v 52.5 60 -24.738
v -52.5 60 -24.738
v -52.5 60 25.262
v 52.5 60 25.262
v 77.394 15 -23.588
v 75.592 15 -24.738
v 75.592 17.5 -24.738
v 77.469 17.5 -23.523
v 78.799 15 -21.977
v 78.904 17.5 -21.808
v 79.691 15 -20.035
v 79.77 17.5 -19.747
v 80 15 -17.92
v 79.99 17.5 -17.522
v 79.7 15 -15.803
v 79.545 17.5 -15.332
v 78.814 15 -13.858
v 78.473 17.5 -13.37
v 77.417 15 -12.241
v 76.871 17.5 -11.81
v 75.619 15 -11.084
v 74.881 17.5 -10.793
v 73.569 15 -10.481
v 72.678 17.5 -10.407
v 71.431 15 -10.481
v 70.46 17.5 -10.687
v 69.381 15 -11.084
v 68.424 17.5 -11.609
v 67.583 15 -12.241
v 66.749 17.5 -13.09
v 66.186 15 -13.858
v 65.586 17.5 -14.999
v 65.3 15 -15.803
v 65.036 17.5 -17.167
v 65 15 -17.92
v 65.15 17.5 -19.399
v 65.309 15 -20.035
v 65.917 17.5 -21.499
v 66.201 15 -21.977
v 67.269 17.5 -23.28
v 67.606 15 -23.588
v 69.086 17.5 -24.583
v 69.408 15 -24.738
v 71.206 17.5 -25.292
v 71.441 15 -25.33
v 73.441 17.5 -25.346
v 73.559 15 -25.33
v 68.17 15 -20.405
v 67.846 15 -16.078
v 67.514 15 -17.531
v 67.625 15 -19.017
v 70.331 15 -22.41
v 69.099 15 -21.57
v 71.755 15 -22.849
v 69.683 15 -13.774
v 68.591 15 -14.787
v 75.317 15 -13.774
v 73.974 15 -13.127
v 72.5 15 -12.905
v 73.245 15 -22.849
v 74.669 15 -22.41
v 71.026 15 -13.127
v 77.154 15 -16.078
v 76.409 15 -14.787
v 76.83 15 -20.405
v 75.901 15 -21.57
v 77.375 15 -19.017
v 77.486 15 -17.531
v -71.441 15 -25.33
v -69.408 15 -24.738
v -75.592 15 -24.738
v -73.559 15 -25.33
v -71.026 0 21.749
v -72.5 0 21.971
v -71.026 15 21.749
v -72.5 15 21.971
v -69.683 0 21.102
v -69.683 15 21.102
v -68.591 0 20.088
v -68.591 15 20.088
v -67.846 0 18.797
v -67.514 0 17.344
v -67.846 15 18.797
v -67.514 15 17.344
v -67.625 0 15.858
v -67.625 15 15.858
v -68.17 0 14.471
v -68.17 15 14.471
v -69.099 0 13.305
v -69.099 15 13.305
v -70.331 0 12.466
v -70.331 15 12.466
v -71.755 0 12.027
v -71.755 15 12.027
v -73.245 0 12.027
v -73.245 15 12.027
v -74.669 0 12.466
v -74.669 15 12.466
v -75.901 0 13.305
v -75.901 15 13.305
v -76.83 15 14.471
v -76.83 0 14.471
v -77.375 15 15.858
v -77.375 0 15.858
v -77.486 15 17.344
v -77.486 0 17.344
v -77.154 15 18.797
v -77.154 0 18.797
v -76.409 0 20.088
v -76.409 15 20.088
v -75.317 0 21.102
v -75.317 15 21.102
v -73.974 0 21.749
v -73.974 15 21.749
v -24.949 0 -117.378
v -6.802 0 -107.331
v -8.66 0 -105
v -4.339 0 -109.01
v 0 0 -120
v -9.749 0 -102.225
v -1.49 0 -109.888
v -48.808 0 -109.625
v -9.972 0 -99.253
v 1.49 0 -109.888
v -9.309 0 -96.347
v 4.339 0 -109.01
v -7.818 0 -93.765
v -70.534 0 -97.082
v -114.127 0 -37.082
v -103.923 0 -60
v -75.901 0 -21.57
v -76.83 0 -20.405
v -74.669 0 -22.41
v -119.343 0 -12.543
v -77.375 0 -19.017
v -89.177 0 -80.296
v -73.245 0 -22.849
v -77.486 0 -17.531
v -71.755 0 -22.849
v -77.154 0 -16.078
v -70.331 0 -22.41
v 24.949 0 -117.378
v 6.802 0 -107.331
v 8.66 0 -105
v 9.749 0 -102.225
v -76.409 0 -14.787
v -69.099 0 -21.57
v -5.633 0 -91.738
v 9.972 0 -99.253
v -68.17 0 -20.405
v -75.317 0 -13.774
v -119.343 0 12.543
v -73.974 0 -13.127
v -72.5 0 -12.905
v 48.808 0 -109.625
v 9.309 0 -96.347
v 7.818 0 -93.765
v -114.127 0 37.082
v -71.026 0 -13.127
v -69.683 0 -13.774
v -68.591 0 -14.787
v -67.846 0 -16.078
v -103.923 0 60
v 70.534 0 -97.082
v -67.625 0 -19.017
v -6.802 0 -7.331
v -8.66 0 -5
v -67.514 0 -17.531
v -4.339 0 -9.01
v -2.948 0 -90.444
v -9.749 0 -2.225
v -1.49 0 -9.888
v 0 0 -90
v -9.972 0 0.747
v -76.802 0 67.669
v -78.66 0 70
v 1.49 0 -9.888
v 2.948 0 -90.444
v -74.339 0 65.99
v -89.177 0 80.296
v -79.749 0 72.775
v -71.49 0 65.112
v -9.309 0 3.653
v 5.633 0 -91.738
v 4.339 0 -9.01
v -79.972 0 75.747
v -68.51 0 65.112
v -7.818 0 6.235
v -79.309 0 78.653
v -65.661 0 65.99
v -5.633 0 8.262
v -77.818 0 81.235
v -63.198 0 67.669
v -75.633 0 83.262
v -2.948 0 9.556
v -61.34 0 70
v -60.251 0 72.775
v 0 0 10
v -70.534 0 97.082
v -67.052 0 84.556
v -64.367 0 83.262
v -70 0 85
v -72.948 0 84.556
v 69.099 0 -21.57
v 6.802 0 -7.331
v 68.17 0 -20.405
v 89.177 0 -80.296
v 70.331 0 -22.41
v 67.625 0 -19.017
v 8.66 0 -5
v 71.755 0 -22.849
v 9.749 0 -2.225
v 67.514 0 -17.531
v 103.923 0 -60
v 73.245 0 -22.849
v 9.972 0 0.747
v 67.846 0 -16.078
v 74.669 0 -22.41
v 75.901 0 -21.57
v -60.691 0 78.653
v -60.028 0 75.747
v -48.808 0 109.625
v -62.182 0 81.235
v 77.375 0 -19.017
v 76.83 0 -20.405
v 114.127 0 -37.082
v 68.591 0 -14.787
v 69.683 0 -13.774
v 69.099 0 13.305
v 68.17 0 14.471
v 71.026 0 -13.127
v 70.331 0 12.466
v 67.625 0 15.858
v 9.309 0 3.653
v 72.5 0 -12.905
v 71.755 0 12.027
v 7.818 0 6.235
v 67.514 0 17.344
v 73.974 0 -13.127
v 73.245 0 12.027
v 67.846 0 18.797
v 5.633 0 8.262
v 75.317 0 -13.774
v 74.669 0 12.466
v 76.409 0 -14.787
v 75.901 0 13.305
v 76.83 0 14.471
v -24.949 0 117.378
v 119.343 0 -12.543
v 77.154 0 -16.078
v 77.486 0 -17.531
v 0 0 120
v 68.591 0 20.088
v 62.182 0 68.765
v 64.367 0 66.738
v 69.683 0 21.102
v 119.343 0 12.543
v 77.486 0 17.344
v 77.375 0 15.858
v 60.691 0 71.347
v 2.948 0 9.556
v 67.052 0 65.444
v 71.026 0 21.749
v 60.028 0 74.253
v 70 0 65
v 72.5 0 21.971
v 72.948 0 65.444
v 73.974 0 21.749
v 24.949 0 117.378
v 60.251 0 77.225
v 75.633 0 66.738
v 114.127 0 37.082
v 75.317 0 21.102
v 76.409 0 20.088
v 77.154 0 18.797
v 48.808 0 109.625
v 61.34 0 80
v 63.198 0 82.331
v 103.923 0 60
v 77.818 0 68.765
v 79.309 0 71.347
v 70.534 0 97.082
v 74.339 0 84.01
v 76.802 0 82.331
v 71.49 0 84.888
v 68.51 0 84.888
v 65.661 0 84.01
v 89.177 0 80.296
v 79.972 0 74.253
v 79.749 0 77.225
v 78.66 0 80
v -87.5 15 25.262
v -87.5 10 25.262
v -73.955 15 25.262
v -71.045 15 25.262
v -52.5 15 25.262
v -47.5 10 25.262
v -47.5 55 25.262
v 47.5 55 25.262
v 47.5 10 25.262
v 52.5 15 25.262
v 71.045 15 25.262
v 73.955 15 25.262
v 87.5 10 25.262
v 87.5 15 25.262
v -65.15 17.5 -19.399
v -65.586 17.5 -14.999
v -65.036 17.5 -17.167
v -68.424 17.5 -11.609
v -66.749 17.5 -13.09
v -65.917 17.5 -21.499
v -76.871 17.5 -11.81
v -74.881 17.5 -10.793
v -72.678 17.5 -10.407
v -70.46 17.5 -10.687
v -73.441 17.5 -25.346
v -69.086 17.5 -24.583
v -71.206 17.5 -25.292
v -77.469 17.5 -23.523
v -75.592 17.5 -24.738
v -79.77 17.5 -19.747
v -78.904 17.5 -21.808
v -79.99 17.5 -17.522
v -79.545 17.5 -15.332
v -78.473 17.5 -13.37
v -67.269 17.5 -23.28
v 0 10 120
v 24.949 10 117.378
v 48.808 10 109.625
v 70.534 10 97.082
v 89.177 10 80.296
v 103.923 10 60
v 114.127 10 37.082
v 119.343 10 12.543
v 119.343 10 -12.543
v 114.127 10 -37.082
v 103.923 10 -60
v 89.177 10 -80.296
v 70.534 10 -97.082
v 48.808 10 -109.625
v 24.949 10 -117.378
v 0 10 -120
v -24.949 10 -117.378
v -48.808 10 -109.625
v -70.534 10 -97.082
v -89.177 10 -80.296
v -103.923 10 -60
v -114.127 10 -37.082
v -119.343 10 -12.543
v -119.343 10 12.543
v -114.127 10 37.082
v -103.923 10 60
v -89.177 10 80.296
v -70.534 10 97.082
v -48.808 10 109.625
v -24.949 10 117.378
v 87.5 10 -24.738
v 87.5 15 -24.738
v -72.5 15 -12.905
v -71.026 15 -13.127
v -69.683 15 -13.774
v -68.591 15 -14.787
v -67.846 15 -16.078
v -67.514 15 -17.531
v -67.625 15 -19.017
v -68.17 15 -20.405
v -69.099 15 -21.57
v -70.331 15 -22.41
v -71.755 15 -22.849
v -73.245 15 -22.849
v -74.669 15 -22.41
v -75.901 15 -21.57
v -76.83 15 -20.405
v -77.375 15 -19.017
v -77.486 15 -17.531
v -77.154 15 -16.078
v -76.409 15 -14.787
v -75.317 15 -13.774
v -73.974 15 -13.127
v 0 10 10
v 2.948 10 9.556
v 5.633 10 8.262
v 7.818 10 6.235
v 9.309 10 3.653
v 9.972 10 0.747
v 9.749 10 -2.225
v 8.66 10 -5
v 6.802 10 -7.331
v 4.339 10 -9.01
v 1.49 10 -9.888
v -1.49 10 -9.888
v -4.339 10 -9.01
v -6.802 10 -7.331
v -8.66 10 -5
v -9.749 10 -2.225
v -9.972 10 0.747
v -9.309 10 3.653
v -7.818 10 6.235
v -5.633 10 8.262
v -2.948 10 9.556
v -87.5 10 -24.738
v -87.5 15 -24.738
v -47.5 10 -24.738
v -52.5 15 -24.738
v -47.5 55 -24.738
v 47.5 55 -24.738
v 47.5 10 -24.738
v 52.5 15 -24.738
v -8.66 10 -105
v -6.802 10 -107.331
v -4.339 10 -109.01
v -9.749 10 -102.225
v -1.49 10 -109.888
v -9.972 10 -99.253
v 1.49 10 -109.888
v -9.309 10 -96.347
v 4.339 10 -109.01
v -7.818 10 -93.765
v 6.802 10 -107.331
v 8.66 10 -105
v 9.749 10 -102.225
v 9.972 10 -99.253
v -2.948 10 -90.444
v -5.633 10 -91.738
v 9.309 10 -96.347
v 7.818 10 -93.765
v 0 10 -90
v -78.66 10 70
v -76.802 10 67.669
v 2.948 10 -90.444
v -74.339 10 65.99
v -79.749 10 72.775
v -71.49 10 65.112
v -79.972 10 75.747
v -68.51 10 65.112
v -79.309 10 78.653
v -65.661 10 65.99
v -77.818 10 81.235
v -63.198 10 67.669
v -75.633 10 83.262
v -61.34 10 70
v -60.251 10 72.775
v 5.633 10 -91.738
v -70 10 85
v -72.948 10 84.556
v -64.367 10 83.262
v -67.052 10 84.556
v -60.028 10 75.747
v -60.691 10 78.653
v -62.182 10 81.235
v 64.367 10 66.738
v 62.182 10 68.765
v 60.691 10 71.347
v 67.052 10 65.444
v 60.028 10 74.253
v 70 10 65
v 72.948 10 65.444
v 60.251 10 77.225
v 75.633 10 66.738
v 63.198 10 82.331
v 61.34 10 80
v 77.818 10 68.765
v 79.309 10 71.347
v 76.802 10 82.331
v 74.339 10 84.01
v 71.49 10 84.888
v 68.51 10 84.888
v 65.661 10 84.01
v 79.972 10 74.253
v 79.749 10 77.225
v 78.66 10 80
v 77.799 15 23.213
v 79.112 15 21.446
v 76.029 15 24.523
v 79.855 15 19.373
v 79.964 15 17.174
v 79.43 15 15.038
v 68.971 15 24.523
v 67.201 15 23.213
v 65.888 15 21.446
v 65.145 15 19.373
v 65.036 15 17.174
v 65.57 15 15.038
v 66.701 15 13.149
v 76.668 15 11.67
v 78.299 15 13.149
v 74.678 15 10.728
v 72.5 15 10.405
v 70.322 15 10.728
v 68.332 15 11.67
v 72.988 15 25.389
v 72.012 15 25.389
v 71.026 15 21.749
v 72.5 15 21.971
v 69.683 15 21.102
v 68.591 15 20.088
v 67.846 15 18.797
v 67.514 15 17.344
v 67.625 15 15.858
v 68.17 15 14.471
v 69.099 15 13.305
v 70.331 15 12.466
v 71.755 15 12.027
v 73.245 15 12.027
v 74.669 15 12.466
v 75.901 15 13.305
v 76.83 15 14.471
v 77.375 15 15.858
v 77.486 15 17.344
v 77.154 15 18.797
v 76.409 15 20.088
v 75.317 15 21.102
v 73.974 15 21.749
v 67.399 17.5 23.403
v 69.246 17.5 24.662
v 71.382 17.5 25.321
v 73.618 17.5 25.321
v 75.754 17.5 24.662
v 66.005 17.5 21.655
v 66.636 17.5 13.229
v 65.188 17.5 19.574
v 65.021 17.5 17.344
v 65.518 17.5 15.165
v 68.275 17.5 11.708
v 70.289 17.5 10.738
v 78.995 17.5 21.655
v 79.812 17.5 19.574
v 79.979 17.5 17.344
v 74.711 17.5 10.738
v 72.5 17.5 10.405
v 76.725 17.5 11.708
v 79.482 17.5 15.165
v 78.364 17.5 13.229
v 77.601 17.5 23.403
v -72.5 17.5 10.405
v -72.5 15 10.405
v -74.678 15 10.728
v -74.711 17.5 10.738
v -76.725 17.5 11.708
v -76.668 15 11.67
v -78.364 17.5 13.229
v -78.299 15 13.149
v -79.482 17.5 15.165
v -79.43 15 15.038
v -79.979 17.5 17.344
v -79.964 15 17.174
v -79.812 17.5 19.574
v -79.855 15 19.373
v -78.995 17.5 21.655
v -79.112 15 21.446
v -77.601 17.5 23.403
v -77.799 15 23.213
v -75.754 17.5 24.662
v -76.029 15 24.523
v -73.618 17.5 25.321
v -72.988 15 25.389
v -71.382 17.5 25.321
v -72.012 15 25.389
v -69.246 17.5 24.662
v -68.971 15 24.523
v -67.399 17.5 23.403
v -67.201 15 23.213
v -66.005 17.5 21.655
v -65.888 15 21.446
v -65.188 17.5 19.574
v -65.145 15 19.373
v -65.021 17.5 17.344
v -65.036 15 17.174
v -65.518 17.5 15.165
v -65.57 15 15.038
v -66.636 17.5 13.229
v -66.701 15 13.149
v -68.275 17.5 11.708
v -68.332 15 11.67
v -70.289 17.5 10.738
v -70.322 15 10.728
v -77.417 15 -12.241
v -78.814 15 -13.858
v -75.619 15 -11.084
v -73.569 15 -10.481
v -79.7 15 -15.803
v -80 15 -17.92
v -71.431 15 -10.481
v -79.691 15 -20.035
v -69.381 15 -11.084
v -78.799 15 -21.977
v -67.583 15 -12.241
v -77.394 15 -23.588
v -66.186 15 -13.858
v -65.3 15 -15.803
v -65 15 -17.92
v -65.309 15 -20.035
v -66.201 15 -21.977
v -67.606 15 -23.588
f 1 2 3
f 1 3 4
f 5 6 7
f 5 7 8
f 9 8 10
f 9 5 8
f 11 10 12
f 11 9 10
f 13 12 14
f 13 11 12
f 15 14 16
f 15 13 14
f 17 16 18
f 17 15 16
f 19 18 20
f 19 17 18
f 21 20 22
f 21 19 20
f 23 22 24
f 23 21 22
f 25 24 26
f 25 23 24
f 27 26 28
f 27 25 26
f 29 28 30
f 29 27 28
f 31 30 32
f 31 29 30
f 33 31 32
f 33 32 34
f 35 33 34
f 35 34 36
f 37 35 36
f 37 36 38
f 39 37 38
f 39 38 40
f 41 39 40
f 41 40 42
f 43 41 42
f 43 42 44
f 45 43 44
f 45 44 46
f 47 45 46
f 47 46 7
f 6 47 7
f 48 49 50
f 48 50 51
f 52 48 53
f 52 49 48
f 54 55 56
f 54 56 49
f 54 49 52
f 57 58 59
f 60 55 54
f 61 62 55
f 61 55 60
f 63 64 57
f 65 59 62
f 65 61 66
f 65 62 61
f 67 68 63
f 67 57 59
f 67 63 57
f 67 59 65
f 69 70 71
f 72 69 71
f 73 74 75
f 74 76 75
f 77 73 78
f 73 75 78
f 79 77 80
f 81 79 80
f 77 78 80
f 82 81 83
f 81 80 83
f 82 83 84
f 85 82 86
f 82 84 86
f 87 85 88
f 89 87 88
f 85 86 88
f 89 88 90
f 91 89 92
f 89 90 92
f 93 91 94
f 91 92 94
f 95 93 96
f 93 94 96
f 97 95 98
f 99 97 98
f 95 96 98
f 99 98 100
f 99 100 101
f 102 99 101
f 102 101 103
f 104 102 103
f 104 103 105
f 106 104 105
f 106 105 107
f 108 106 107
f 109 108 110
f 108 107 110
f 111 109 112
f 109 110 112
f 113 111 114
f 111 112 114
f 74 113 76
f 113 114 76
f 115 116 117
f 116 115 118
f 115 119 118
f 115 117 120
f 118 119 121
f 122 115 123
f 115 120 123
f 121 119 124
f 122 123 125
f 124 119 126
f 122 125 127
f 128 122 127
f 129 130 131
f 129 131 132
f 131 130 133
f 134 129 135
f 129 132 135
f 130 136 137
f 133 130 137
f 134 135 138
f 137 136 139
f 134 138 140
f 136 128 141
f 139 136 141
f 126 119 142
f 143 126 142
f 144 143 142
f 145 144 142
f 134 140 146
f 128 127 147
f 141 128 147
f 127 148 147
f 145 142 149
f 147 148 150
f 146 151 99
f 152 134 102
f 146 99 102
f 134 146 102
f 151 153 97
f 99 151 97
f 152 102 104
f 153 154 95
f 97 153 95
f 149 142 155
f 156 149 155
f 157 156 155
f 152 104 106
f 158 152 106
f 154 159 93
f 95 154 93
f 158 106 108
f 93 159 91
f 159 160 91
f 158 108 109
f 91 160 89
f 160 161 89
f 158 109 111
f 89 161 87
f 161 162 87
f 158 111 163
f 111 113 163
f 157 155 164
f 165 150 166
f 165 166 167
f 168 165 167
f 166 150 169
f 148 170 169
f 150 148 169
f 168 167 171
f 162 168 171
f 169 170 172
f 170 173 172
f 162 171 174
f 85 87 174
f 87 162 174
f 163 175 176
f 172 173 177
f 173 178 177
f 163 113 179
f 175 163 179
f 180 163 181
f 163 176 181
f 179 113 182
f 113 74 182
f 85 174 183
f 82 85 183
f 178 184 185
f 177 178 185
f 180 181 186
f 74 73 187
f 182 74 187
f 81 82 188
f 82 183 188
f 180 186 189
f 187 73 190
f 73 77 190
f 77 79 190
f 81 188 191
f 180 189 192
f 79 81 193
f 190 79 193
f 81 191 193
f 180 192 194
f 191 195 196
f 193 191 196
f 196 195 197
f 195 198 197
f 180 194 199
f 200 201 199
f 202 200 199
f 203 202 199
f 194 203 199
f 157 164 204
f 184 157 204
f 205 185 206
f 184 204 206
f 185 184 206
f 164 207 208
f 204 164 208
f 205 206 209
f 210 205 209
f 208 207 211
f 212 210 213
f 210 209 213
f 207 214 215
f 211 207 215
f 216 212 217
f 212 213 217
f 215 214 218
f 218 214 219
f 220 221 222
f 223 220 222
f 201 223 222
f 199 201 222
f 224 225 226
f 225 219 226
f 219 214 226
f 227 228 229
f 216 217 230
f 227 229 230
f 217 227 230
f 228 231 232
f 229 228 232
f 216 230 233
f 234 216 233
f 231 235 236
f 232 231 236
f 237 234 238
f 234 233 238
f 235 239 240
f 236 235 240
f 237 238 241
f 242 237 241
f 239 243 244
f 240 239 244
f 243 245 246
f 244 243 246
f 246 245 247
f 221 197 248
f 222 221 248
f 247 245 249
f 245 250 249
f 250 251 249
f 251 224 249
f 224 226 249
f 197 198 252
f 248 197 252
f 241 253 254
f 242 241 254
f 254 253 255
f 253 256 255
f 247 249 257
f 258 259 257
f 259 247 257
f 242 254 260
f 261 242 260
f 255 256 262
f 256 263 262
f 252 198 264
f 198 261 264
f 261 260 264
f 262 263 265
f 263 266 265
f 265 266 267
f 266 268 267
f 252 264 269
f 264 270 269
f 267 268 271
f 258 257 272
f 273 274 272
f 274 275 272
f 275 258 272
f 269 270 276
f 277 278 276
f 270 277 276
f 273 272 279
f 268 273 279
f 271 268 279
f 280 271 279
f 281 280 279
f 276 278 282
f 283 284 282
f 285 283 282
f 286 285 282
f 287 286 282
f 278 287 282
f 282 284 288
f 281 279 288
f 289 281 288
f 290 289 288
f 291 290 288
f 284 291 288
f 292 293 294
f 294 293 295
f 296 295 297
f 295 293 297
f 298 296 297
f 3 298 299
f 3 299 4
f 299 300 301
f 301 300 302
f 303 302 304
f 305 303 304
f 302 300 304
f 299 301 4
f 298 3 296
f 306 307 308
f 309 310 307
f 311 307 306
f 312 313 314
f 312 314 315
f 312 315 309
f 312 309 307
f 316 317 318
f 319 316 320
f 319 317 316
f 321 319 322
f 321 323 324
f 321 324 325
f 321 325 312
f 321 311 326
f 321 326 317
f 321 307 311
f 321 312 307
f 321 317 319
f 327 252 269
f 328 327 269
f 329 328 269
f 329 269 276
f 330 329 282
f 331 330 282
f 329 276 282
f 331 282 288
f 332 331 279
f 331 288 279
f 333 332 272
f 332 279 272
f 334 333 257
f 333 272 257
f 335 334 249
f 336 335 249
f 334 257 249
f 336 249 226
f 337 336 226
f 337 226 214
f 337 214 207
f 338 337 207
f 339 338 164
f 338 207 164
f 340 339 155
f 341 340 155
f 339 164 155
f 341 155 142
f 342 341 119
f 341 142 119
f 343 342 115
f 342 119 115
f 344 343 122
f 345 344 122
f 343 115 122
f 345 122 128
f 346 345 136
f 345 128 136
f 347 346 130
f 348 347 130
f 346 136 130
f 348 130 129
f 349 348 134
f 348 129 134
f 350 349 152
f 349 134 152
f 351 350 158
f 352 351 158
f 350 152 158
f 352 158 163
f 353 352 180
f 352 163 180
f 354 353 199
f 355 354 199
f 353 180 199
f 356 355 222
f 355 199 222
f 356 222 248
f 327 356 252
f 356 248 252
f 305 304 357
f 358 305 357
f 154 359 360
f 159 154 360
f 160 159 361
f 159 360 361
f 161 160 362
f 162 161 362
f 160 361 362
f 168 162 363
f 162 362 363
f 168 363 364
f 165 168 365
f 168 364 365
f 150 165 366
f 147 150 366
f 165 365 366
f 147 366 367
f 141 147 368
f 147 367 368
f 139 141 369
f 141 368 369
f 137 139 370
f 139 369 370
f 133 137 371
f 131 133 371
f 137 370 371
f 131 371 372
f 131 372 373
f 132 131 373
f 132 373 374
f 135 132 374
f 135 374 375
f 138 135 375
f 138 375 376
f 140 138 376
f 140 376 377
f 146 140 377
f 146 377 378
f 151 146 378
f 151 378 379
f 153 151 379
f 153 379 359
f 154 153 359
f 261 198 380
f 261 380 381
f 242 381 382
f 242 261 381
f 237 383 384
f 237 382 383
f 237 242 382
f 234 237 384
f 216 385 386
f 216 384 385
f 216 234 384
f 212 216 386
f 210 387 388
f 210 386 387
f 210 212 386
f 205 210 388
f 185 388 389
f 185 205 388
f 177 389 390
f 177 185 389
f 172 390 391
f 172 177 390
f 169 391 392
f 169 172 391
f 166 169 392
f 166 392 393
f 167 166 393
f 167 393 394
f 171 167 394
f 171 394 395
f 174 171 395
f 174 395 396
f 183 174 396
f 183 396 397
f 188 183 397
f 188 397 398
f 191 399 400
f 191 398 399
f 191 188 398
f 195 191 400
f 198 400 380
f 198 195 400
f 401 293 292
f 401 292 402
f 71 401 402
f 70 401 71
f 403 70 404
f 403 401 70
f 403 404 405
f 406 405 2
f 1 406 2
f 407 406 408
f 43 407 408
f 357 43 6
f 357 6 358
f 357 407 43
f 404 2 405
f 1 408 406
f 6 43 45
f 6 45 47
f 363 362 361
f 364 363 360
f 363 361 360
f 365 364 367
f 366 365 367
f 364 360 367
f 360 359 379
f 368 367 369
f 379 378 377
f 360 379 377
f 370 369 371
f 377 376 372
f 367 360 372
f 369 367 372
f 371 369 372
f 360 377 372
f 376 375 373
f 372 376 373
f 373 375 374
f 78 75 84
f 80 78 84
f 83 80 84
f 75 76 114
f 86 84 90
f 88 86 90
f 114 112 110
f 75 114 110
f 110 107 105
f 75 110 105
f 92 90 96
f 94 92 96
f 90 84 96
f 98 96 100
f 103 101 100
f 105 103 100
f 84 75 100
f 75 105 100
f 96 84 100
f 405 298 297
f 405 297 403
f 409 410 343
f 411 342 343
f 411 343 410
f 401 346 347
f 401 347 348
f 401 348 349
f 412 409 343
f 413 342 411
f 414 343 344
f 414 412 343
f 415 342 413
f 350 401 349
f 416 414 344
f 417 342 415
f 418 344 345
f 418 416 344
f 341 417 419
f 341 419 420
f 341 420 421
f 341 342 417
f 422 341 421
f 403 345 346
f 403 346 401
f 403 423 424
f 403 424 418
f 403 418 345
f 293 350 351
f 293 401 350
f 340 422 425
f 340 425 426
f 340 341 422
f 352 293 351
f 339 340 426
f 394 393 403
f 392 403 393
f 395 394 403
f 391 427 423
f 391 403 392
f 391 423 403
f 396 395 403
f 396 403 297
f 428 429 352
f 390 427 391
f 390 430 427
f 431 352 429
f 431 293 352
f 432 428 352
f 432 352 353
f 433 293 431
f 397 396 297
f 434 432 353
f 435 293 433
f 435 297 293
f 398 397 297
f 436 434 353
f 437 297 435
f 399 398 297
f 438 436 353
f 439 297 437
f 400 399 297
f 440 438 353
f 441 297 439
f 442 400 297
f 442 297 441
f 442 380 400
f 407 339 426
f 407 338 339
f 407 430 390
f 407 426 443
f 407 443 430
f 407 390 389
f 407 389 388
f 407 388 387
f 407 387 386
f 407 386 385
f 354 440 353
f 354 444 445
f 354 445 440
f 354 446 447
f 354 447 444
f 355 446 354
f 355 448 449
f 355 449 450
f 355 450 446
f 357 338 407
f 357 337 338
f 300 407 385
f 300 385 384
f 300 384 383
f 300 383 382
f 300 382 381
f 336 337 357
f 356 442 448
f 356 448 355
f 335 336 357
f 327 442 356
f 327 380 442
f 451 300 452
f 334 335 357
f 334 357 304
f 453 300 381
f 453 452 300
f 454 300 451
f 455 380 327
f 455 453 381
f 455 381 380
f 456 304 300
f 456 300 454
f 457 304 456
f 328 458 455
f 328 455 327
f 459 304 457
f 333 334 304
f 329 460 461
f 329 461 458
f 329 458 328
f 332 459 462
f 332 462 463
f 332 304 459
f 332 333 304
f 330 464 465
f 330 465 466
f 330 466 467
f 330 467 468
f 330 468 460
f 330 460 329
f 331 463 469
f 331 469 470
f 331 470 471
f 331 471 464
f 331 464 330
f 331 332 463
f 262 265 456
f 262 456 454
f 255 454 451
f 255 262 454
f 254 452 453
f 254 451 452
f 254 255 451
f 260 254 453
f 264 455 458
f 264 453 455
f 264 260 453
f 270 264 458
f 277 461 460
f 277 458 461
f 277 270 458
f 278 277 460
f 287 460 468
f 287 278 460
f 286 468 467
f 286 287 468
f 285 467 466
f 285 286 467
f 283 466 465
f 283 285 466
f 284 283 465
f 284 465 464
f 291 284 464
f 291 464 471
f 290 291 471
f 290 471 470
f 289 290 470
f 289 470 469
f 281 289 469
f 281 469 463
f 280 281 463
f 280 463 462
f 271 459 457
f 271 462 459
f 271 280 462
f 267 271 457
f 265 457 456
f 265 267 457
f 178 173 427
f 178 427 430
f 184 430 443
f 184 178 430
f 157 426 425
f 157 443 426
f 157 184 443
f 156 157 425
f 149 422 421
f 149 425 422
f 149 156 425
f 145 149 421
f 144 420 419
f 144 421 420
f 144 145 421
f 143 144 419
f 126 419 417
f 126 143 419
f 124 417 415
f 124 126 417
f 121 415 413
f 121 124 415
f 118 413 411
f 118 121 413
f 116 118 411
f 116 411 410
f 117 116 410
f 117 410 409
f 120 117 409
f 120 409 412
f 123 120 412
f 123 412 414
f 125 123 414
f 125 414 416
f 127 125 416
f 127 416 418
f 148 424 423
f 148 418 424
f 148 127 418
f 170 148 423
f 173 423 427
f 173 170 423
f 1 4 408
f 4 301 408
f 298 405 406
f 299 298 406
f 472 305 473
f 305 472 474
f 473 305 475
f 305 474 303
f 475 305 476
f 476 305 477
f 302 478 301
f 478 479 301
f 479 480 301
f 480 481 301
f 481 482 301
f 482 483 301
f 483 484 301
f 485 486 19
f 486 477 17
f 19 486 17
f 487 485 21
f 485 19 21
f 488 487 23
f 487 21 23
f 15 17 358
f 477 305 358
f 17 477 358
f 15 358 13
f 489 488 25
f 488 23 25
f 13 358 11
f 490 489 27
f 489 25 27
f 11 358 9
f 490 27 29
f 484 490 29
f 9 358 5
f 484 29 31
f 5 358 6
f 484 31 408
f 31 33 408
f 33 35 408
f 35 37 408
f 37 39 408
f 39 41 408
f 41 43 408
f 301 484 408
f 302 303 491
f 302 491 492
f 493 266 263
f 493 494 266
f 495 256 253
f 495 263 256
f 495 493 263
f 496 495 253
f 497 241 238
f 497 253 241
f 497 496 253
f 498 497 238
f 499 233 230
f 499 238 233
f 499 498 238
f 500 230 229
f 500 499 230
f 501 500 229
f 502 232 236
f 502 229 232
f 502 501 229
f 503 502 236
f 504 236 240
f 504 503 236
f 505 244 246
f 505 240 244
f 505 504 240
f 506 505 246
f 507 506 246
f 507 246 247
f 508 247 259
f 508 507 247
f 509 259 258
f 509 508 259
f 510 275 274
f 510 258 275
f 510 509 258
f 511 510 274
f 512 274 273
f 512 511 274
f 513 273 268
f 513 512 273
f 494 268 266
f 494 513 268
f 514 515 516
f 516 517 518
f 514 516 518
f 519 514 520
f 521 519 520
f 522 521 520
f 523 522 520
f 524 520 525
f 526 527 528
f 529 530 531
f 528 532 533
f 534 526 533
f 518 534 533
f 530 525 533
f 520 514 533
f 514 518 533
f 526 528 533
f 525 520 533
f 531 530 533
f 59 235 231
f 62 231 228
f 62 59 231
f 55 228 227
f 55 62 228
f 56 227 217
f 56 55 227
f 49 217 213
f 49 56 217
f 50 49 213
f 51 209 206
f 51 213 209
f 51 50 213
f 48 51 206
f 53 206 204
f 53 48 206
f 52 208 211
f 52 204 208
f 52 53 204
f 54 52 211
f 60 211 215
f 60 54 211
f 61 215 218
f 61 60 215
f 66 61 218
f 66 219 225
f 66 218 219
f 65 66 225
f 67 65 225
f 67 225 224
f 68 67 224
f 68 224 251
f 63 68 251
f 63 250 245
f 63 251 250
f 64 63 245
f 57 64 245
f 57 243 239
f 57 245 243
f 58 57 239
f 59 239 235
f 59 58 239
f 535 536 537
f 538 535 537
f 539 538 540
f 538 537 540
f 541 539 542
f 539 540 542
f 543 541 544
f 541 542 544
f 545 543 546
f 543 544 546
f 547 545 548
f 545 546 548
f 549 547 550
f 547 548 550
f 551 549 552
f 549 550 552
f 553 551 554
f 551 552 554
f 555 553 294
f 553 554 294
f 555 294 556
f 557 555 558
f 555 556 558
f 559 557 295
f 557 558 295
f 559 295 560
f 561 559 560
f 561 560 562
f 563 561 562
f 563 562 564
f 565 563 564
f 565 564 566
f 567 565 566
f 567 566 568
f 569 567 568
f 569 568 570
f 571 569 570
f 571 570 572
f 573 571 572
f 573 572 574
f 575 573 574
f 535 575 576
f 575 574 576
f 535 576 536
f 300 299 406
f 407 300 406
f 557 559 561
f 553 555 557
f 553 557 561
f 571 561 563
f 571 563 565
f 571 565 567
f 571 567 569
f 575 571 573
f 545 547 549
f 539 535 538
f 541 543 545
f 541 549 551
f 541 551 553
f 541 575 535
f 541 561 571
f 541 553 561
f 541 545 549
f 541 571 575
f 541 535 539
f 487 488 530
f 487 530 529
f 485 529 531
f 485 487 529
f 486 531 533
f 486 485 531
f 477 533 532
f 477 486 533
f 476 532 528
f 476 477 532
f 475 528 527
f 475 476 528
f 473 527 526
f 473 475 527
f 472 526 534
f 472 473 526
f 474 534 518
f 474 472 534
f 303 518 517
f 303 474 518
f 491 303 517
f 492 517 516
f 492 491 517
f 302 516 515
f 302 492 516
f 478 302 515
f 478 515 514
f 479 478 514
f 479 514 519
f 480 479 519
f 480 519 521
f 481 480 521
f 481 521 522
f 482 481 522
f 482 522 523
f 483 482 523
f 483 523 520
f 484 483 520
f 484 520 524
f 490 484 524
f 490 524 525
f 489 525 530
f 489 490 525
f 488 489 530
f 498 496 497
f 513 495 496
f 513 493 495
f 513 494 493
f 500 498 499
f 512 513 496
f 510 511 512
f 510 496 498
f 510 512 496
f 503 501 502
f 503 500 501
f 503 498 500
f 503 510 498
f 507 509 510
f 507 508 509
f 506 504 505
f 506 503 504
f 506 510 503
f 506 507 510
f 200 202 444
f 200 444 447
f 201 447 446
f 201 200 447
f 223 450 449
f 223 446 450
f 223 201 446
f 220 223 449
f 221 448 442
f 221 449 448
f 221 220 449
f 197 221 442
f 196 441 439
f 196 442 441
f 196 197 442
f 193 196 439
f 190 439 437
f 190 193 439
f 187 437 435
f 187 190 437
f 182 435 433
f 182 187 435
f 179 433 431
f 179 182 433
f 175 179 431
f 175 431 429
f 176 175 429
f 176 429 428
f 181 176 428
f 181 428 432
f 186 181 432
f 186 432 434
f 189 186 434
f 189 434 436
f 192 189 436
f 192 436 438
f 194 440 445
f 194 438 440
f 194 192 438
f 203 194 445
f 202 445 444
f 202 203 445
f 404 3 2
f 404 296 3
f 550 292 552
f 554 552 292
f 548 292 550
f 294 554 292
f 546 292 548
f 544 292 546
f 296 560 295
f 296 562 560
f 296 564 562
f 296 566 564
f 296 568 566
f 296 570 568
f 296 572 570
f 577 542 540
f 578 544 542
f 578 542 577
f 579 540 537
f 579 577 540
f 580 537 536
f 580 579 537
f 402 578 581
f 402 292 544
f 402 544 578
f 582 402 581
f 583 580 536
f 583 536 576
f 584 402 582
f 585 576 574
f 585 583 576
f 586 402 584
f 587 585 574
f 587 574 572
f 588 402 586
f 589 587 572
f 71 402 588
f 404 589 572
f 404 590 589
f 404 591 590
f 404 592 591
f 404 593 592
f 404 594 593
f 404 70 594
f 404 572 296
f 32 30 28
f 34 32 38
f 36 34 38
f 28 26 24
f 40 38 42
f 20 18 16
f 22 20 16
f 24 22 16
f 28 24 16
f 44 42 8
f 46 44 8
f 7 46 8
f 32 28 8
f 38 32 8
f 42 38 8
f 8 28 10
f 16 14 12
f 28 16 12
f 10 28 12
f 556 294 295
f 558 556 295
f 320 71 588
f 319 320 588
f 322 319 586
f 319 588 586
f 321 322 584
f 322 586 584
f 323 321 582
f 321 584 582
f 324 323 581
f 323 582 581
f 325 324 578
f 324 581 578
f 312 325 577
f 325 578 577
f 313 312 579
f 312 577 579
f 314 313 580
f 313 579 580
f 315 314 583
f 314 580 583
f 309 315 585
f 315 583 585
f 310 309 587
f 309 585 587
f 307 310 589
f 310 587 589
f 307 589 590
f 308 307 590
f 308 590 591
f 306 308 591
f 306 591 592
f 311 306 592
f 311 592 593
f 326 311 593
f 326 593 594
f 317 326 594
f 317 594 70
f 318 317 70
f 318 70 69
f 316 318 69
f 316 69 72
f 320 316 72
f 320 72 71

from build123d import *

# Parameters (mm, degrees)
SKETCH1_R               = 120
BOSS_EXTRUDE1_DEPTH     = 10
CUT_EXTRUDE1_DEPTH      = 171
CUT_EXTRUDE1_DEPTH_BACK = 171
SKETCH2_R               = 10
CUT_EXTRUDE2_DEPTH      = 171
CUT_EXTRUDE2_DEPTH_BACK = 171
SKETCH3_R               = 10
SKETCH8_W               = 35
SKETCH8_H               = 50
BOSS_EXTRUDE3_DEPTH     = 5
SKETCH9_W               = 50
SKETCH9_H               = 45
BOSS_EXTRUDE4_DEPTH     = 5
SKETCH10_W              = 105
SKETCH10_H              = 50
BOSS_EXTRUDE5_DEPTH     = 5
SKETCH11_R              = 5
CUT_EXTRUDE3_DEPTH      = 176.570498661
SKETCH12_R              = 7.5
BOSS_EXTRUDE6_DEPTH     = 2.5


with BuildPart() as part:
    # Sketch1 → Boss-Extrude1 (new body)
    with BuildSketch(Plane(origin=(0, 0, 0), x_dir=(1, 0, 0), z_dir=(0, 1, 0))):
        with Locations(Location((0, 0, 0), (0, 0, 270))):
            Circle(SKETCH1_R)
    extrude(amount=BOSS_EXTRUDE1_DEPTH)

    # Sketch2 → Cut-Extrude1 (cut, two sides: drawn at the far end of the back side and taken through both)
    with BuildSketch(Plane(origin=(0, 10, 0), x_dir=(1, 0, 0), z_dir=(0, 1, 0)).offset(-CUT_EXTRUDE1_DEPTH_BACK)):
        with Locations(Location((0, 0, 0), (0, 0, 270))):
            Circle(SKETCH2_R)
    extrude(amount=CUT_EXTRUDE1_DEPTH + CUT_EXTRUDE1_DEPTH_BACK, mode=Mode.SUBTRACT)

    # Sketch3 → Cut-Extrude2 (cut, two sides: drawn at the far end of the back side and taken through both)
    with BuildSketch(Plane(origin=(0, 10, 0), x_dir=(1, 0, 0), z_dir=(0, 1, 0)).offset(-CUT_EXTRUDE2_DEPTH_BACK)):
        with Locations(Location((0, 100, 0), (0, 0, 270))):
            Circle(SKETCH3_R)
        with Locations(Location((-70, -75, 0), (0, 0, 270))):
            Circle(SKETCH3_R)
        with Locations(Location((70, -75, 0), (0, 0, 90))):
            Circle(SKETCH3_R)
    extrude(amount=CUT_EXTRUDE2_DEPTH + CUT_EXTRUDE2_DEPTH_BACK, mode=Mode.SUBTRACT)

    # Sketch8 → Boss-Extrude3 (add)
    with BuildSketch(Plane(origin=(0, 10, 0), x_dir=(1, 0, 0), z_dir=(0, 1, 0))):
        with Locations((-70, -0.262373312)):
            Rectangle(SKETCH8_W, SKETCH8_H)
    boss_extrude3 = extrude(amount=BOSS_EXTRUDE3_DEPTH)

    # Mirror2: Boss-Extrude3 across plane
    add(boss_extrude3.mirror(Plane(origin=(0, 0, 0), x_dir=(0, 0, 1), z_dir=(1, 0, 0))))

    # Sketch9 → Boss-Extrude4 (add)
    with BuildSketch(Plane(origin=(-52.5, 0, 0), x_dir=(0, 0, -1), z_dir=(1, 0, 0))):
        with Locations((-0.262373312, 32.5)):
            Rectangle(SKETCH9_W, SKETCH9_H)
    boss_extrude4 = extrude(amount=BOSS_EXTRUDE4_DEPTH)

    # Mirror3: Boss-Extrude4 across plane
    add(boss_extrude4.mirror(Plane(origin=(0, 0, 0), x_dir=(0, 0, 1), z_dir=(1, 0, 0))))

    # Sketch10 → Boss-Extrude5 (add)
    with BuildSketch(Plane(origin=(0, 55, 0), x_dir=(1, 0, 0), z_dir=(0, 1, 0))):
        with Locations((0, -0.262373312)):
            Rectangle(SKETCH10_W, SKETCH10_H)
    extrude(amount=BOSS_EXTRUDE5_DEPTH)

    # Sketch11 → Cut-Extrude3 (cut, symmetric)
    with BuildSketch(Plane(origin=(0, 15, 0), x_dir=(1, 0, 0), z_dir=(0, 1, 0))):
        with Locations(Location((-72.5, 17.904853765, 0), (0, 0, 270))):
            Circle(SKETCH11_R)
        with Locations(Location((-72.5, -16.970687481, 0), (0, 0, 270))):
            Circle(SKETCH11_R)
    cut_extrude3 = extrude(amount=CUT_EXTRUDE3_DEPTH, both=True, mode=Mode.SUBTRACT)

    # Mirror4: Cut-Extrude3 across plane
    add(cut_extrude3.mirror(Plane(origin=(0, 0, 0), x_dir=(0, 0, 1), z_dir=(1, 0, 0))), mode=Mode.SUBTRACT)

    # Sketch12 → Boss-Extrude6 (add)
    with BuildSketch(Plane(origin=(0, 15, 0), x_dir=(1, 0, 0), z_dir=(0, 1, 0))):
        with Locations(Location((-72.5, 17.904853765, 0), (0, 0, 114.351031906))):
            Circle(SKETCH12_R)
        with Locations(Location((-72.5, -17.904853765, 0), (0, 0, 90))):
            Circle(SKETCH12_R)
    boss_extrude6 = extrude(amount=BOSS_EXTRUDE6_DEPTH)

    # Mirror5: Boss-Extrude6 across plane
    add(boss_extrude6.mirror(Plane(origin=(0, 0, 0), x_dir=(0, 0, 1), z_dir=(1, 0, 0))))


solid = part.part
